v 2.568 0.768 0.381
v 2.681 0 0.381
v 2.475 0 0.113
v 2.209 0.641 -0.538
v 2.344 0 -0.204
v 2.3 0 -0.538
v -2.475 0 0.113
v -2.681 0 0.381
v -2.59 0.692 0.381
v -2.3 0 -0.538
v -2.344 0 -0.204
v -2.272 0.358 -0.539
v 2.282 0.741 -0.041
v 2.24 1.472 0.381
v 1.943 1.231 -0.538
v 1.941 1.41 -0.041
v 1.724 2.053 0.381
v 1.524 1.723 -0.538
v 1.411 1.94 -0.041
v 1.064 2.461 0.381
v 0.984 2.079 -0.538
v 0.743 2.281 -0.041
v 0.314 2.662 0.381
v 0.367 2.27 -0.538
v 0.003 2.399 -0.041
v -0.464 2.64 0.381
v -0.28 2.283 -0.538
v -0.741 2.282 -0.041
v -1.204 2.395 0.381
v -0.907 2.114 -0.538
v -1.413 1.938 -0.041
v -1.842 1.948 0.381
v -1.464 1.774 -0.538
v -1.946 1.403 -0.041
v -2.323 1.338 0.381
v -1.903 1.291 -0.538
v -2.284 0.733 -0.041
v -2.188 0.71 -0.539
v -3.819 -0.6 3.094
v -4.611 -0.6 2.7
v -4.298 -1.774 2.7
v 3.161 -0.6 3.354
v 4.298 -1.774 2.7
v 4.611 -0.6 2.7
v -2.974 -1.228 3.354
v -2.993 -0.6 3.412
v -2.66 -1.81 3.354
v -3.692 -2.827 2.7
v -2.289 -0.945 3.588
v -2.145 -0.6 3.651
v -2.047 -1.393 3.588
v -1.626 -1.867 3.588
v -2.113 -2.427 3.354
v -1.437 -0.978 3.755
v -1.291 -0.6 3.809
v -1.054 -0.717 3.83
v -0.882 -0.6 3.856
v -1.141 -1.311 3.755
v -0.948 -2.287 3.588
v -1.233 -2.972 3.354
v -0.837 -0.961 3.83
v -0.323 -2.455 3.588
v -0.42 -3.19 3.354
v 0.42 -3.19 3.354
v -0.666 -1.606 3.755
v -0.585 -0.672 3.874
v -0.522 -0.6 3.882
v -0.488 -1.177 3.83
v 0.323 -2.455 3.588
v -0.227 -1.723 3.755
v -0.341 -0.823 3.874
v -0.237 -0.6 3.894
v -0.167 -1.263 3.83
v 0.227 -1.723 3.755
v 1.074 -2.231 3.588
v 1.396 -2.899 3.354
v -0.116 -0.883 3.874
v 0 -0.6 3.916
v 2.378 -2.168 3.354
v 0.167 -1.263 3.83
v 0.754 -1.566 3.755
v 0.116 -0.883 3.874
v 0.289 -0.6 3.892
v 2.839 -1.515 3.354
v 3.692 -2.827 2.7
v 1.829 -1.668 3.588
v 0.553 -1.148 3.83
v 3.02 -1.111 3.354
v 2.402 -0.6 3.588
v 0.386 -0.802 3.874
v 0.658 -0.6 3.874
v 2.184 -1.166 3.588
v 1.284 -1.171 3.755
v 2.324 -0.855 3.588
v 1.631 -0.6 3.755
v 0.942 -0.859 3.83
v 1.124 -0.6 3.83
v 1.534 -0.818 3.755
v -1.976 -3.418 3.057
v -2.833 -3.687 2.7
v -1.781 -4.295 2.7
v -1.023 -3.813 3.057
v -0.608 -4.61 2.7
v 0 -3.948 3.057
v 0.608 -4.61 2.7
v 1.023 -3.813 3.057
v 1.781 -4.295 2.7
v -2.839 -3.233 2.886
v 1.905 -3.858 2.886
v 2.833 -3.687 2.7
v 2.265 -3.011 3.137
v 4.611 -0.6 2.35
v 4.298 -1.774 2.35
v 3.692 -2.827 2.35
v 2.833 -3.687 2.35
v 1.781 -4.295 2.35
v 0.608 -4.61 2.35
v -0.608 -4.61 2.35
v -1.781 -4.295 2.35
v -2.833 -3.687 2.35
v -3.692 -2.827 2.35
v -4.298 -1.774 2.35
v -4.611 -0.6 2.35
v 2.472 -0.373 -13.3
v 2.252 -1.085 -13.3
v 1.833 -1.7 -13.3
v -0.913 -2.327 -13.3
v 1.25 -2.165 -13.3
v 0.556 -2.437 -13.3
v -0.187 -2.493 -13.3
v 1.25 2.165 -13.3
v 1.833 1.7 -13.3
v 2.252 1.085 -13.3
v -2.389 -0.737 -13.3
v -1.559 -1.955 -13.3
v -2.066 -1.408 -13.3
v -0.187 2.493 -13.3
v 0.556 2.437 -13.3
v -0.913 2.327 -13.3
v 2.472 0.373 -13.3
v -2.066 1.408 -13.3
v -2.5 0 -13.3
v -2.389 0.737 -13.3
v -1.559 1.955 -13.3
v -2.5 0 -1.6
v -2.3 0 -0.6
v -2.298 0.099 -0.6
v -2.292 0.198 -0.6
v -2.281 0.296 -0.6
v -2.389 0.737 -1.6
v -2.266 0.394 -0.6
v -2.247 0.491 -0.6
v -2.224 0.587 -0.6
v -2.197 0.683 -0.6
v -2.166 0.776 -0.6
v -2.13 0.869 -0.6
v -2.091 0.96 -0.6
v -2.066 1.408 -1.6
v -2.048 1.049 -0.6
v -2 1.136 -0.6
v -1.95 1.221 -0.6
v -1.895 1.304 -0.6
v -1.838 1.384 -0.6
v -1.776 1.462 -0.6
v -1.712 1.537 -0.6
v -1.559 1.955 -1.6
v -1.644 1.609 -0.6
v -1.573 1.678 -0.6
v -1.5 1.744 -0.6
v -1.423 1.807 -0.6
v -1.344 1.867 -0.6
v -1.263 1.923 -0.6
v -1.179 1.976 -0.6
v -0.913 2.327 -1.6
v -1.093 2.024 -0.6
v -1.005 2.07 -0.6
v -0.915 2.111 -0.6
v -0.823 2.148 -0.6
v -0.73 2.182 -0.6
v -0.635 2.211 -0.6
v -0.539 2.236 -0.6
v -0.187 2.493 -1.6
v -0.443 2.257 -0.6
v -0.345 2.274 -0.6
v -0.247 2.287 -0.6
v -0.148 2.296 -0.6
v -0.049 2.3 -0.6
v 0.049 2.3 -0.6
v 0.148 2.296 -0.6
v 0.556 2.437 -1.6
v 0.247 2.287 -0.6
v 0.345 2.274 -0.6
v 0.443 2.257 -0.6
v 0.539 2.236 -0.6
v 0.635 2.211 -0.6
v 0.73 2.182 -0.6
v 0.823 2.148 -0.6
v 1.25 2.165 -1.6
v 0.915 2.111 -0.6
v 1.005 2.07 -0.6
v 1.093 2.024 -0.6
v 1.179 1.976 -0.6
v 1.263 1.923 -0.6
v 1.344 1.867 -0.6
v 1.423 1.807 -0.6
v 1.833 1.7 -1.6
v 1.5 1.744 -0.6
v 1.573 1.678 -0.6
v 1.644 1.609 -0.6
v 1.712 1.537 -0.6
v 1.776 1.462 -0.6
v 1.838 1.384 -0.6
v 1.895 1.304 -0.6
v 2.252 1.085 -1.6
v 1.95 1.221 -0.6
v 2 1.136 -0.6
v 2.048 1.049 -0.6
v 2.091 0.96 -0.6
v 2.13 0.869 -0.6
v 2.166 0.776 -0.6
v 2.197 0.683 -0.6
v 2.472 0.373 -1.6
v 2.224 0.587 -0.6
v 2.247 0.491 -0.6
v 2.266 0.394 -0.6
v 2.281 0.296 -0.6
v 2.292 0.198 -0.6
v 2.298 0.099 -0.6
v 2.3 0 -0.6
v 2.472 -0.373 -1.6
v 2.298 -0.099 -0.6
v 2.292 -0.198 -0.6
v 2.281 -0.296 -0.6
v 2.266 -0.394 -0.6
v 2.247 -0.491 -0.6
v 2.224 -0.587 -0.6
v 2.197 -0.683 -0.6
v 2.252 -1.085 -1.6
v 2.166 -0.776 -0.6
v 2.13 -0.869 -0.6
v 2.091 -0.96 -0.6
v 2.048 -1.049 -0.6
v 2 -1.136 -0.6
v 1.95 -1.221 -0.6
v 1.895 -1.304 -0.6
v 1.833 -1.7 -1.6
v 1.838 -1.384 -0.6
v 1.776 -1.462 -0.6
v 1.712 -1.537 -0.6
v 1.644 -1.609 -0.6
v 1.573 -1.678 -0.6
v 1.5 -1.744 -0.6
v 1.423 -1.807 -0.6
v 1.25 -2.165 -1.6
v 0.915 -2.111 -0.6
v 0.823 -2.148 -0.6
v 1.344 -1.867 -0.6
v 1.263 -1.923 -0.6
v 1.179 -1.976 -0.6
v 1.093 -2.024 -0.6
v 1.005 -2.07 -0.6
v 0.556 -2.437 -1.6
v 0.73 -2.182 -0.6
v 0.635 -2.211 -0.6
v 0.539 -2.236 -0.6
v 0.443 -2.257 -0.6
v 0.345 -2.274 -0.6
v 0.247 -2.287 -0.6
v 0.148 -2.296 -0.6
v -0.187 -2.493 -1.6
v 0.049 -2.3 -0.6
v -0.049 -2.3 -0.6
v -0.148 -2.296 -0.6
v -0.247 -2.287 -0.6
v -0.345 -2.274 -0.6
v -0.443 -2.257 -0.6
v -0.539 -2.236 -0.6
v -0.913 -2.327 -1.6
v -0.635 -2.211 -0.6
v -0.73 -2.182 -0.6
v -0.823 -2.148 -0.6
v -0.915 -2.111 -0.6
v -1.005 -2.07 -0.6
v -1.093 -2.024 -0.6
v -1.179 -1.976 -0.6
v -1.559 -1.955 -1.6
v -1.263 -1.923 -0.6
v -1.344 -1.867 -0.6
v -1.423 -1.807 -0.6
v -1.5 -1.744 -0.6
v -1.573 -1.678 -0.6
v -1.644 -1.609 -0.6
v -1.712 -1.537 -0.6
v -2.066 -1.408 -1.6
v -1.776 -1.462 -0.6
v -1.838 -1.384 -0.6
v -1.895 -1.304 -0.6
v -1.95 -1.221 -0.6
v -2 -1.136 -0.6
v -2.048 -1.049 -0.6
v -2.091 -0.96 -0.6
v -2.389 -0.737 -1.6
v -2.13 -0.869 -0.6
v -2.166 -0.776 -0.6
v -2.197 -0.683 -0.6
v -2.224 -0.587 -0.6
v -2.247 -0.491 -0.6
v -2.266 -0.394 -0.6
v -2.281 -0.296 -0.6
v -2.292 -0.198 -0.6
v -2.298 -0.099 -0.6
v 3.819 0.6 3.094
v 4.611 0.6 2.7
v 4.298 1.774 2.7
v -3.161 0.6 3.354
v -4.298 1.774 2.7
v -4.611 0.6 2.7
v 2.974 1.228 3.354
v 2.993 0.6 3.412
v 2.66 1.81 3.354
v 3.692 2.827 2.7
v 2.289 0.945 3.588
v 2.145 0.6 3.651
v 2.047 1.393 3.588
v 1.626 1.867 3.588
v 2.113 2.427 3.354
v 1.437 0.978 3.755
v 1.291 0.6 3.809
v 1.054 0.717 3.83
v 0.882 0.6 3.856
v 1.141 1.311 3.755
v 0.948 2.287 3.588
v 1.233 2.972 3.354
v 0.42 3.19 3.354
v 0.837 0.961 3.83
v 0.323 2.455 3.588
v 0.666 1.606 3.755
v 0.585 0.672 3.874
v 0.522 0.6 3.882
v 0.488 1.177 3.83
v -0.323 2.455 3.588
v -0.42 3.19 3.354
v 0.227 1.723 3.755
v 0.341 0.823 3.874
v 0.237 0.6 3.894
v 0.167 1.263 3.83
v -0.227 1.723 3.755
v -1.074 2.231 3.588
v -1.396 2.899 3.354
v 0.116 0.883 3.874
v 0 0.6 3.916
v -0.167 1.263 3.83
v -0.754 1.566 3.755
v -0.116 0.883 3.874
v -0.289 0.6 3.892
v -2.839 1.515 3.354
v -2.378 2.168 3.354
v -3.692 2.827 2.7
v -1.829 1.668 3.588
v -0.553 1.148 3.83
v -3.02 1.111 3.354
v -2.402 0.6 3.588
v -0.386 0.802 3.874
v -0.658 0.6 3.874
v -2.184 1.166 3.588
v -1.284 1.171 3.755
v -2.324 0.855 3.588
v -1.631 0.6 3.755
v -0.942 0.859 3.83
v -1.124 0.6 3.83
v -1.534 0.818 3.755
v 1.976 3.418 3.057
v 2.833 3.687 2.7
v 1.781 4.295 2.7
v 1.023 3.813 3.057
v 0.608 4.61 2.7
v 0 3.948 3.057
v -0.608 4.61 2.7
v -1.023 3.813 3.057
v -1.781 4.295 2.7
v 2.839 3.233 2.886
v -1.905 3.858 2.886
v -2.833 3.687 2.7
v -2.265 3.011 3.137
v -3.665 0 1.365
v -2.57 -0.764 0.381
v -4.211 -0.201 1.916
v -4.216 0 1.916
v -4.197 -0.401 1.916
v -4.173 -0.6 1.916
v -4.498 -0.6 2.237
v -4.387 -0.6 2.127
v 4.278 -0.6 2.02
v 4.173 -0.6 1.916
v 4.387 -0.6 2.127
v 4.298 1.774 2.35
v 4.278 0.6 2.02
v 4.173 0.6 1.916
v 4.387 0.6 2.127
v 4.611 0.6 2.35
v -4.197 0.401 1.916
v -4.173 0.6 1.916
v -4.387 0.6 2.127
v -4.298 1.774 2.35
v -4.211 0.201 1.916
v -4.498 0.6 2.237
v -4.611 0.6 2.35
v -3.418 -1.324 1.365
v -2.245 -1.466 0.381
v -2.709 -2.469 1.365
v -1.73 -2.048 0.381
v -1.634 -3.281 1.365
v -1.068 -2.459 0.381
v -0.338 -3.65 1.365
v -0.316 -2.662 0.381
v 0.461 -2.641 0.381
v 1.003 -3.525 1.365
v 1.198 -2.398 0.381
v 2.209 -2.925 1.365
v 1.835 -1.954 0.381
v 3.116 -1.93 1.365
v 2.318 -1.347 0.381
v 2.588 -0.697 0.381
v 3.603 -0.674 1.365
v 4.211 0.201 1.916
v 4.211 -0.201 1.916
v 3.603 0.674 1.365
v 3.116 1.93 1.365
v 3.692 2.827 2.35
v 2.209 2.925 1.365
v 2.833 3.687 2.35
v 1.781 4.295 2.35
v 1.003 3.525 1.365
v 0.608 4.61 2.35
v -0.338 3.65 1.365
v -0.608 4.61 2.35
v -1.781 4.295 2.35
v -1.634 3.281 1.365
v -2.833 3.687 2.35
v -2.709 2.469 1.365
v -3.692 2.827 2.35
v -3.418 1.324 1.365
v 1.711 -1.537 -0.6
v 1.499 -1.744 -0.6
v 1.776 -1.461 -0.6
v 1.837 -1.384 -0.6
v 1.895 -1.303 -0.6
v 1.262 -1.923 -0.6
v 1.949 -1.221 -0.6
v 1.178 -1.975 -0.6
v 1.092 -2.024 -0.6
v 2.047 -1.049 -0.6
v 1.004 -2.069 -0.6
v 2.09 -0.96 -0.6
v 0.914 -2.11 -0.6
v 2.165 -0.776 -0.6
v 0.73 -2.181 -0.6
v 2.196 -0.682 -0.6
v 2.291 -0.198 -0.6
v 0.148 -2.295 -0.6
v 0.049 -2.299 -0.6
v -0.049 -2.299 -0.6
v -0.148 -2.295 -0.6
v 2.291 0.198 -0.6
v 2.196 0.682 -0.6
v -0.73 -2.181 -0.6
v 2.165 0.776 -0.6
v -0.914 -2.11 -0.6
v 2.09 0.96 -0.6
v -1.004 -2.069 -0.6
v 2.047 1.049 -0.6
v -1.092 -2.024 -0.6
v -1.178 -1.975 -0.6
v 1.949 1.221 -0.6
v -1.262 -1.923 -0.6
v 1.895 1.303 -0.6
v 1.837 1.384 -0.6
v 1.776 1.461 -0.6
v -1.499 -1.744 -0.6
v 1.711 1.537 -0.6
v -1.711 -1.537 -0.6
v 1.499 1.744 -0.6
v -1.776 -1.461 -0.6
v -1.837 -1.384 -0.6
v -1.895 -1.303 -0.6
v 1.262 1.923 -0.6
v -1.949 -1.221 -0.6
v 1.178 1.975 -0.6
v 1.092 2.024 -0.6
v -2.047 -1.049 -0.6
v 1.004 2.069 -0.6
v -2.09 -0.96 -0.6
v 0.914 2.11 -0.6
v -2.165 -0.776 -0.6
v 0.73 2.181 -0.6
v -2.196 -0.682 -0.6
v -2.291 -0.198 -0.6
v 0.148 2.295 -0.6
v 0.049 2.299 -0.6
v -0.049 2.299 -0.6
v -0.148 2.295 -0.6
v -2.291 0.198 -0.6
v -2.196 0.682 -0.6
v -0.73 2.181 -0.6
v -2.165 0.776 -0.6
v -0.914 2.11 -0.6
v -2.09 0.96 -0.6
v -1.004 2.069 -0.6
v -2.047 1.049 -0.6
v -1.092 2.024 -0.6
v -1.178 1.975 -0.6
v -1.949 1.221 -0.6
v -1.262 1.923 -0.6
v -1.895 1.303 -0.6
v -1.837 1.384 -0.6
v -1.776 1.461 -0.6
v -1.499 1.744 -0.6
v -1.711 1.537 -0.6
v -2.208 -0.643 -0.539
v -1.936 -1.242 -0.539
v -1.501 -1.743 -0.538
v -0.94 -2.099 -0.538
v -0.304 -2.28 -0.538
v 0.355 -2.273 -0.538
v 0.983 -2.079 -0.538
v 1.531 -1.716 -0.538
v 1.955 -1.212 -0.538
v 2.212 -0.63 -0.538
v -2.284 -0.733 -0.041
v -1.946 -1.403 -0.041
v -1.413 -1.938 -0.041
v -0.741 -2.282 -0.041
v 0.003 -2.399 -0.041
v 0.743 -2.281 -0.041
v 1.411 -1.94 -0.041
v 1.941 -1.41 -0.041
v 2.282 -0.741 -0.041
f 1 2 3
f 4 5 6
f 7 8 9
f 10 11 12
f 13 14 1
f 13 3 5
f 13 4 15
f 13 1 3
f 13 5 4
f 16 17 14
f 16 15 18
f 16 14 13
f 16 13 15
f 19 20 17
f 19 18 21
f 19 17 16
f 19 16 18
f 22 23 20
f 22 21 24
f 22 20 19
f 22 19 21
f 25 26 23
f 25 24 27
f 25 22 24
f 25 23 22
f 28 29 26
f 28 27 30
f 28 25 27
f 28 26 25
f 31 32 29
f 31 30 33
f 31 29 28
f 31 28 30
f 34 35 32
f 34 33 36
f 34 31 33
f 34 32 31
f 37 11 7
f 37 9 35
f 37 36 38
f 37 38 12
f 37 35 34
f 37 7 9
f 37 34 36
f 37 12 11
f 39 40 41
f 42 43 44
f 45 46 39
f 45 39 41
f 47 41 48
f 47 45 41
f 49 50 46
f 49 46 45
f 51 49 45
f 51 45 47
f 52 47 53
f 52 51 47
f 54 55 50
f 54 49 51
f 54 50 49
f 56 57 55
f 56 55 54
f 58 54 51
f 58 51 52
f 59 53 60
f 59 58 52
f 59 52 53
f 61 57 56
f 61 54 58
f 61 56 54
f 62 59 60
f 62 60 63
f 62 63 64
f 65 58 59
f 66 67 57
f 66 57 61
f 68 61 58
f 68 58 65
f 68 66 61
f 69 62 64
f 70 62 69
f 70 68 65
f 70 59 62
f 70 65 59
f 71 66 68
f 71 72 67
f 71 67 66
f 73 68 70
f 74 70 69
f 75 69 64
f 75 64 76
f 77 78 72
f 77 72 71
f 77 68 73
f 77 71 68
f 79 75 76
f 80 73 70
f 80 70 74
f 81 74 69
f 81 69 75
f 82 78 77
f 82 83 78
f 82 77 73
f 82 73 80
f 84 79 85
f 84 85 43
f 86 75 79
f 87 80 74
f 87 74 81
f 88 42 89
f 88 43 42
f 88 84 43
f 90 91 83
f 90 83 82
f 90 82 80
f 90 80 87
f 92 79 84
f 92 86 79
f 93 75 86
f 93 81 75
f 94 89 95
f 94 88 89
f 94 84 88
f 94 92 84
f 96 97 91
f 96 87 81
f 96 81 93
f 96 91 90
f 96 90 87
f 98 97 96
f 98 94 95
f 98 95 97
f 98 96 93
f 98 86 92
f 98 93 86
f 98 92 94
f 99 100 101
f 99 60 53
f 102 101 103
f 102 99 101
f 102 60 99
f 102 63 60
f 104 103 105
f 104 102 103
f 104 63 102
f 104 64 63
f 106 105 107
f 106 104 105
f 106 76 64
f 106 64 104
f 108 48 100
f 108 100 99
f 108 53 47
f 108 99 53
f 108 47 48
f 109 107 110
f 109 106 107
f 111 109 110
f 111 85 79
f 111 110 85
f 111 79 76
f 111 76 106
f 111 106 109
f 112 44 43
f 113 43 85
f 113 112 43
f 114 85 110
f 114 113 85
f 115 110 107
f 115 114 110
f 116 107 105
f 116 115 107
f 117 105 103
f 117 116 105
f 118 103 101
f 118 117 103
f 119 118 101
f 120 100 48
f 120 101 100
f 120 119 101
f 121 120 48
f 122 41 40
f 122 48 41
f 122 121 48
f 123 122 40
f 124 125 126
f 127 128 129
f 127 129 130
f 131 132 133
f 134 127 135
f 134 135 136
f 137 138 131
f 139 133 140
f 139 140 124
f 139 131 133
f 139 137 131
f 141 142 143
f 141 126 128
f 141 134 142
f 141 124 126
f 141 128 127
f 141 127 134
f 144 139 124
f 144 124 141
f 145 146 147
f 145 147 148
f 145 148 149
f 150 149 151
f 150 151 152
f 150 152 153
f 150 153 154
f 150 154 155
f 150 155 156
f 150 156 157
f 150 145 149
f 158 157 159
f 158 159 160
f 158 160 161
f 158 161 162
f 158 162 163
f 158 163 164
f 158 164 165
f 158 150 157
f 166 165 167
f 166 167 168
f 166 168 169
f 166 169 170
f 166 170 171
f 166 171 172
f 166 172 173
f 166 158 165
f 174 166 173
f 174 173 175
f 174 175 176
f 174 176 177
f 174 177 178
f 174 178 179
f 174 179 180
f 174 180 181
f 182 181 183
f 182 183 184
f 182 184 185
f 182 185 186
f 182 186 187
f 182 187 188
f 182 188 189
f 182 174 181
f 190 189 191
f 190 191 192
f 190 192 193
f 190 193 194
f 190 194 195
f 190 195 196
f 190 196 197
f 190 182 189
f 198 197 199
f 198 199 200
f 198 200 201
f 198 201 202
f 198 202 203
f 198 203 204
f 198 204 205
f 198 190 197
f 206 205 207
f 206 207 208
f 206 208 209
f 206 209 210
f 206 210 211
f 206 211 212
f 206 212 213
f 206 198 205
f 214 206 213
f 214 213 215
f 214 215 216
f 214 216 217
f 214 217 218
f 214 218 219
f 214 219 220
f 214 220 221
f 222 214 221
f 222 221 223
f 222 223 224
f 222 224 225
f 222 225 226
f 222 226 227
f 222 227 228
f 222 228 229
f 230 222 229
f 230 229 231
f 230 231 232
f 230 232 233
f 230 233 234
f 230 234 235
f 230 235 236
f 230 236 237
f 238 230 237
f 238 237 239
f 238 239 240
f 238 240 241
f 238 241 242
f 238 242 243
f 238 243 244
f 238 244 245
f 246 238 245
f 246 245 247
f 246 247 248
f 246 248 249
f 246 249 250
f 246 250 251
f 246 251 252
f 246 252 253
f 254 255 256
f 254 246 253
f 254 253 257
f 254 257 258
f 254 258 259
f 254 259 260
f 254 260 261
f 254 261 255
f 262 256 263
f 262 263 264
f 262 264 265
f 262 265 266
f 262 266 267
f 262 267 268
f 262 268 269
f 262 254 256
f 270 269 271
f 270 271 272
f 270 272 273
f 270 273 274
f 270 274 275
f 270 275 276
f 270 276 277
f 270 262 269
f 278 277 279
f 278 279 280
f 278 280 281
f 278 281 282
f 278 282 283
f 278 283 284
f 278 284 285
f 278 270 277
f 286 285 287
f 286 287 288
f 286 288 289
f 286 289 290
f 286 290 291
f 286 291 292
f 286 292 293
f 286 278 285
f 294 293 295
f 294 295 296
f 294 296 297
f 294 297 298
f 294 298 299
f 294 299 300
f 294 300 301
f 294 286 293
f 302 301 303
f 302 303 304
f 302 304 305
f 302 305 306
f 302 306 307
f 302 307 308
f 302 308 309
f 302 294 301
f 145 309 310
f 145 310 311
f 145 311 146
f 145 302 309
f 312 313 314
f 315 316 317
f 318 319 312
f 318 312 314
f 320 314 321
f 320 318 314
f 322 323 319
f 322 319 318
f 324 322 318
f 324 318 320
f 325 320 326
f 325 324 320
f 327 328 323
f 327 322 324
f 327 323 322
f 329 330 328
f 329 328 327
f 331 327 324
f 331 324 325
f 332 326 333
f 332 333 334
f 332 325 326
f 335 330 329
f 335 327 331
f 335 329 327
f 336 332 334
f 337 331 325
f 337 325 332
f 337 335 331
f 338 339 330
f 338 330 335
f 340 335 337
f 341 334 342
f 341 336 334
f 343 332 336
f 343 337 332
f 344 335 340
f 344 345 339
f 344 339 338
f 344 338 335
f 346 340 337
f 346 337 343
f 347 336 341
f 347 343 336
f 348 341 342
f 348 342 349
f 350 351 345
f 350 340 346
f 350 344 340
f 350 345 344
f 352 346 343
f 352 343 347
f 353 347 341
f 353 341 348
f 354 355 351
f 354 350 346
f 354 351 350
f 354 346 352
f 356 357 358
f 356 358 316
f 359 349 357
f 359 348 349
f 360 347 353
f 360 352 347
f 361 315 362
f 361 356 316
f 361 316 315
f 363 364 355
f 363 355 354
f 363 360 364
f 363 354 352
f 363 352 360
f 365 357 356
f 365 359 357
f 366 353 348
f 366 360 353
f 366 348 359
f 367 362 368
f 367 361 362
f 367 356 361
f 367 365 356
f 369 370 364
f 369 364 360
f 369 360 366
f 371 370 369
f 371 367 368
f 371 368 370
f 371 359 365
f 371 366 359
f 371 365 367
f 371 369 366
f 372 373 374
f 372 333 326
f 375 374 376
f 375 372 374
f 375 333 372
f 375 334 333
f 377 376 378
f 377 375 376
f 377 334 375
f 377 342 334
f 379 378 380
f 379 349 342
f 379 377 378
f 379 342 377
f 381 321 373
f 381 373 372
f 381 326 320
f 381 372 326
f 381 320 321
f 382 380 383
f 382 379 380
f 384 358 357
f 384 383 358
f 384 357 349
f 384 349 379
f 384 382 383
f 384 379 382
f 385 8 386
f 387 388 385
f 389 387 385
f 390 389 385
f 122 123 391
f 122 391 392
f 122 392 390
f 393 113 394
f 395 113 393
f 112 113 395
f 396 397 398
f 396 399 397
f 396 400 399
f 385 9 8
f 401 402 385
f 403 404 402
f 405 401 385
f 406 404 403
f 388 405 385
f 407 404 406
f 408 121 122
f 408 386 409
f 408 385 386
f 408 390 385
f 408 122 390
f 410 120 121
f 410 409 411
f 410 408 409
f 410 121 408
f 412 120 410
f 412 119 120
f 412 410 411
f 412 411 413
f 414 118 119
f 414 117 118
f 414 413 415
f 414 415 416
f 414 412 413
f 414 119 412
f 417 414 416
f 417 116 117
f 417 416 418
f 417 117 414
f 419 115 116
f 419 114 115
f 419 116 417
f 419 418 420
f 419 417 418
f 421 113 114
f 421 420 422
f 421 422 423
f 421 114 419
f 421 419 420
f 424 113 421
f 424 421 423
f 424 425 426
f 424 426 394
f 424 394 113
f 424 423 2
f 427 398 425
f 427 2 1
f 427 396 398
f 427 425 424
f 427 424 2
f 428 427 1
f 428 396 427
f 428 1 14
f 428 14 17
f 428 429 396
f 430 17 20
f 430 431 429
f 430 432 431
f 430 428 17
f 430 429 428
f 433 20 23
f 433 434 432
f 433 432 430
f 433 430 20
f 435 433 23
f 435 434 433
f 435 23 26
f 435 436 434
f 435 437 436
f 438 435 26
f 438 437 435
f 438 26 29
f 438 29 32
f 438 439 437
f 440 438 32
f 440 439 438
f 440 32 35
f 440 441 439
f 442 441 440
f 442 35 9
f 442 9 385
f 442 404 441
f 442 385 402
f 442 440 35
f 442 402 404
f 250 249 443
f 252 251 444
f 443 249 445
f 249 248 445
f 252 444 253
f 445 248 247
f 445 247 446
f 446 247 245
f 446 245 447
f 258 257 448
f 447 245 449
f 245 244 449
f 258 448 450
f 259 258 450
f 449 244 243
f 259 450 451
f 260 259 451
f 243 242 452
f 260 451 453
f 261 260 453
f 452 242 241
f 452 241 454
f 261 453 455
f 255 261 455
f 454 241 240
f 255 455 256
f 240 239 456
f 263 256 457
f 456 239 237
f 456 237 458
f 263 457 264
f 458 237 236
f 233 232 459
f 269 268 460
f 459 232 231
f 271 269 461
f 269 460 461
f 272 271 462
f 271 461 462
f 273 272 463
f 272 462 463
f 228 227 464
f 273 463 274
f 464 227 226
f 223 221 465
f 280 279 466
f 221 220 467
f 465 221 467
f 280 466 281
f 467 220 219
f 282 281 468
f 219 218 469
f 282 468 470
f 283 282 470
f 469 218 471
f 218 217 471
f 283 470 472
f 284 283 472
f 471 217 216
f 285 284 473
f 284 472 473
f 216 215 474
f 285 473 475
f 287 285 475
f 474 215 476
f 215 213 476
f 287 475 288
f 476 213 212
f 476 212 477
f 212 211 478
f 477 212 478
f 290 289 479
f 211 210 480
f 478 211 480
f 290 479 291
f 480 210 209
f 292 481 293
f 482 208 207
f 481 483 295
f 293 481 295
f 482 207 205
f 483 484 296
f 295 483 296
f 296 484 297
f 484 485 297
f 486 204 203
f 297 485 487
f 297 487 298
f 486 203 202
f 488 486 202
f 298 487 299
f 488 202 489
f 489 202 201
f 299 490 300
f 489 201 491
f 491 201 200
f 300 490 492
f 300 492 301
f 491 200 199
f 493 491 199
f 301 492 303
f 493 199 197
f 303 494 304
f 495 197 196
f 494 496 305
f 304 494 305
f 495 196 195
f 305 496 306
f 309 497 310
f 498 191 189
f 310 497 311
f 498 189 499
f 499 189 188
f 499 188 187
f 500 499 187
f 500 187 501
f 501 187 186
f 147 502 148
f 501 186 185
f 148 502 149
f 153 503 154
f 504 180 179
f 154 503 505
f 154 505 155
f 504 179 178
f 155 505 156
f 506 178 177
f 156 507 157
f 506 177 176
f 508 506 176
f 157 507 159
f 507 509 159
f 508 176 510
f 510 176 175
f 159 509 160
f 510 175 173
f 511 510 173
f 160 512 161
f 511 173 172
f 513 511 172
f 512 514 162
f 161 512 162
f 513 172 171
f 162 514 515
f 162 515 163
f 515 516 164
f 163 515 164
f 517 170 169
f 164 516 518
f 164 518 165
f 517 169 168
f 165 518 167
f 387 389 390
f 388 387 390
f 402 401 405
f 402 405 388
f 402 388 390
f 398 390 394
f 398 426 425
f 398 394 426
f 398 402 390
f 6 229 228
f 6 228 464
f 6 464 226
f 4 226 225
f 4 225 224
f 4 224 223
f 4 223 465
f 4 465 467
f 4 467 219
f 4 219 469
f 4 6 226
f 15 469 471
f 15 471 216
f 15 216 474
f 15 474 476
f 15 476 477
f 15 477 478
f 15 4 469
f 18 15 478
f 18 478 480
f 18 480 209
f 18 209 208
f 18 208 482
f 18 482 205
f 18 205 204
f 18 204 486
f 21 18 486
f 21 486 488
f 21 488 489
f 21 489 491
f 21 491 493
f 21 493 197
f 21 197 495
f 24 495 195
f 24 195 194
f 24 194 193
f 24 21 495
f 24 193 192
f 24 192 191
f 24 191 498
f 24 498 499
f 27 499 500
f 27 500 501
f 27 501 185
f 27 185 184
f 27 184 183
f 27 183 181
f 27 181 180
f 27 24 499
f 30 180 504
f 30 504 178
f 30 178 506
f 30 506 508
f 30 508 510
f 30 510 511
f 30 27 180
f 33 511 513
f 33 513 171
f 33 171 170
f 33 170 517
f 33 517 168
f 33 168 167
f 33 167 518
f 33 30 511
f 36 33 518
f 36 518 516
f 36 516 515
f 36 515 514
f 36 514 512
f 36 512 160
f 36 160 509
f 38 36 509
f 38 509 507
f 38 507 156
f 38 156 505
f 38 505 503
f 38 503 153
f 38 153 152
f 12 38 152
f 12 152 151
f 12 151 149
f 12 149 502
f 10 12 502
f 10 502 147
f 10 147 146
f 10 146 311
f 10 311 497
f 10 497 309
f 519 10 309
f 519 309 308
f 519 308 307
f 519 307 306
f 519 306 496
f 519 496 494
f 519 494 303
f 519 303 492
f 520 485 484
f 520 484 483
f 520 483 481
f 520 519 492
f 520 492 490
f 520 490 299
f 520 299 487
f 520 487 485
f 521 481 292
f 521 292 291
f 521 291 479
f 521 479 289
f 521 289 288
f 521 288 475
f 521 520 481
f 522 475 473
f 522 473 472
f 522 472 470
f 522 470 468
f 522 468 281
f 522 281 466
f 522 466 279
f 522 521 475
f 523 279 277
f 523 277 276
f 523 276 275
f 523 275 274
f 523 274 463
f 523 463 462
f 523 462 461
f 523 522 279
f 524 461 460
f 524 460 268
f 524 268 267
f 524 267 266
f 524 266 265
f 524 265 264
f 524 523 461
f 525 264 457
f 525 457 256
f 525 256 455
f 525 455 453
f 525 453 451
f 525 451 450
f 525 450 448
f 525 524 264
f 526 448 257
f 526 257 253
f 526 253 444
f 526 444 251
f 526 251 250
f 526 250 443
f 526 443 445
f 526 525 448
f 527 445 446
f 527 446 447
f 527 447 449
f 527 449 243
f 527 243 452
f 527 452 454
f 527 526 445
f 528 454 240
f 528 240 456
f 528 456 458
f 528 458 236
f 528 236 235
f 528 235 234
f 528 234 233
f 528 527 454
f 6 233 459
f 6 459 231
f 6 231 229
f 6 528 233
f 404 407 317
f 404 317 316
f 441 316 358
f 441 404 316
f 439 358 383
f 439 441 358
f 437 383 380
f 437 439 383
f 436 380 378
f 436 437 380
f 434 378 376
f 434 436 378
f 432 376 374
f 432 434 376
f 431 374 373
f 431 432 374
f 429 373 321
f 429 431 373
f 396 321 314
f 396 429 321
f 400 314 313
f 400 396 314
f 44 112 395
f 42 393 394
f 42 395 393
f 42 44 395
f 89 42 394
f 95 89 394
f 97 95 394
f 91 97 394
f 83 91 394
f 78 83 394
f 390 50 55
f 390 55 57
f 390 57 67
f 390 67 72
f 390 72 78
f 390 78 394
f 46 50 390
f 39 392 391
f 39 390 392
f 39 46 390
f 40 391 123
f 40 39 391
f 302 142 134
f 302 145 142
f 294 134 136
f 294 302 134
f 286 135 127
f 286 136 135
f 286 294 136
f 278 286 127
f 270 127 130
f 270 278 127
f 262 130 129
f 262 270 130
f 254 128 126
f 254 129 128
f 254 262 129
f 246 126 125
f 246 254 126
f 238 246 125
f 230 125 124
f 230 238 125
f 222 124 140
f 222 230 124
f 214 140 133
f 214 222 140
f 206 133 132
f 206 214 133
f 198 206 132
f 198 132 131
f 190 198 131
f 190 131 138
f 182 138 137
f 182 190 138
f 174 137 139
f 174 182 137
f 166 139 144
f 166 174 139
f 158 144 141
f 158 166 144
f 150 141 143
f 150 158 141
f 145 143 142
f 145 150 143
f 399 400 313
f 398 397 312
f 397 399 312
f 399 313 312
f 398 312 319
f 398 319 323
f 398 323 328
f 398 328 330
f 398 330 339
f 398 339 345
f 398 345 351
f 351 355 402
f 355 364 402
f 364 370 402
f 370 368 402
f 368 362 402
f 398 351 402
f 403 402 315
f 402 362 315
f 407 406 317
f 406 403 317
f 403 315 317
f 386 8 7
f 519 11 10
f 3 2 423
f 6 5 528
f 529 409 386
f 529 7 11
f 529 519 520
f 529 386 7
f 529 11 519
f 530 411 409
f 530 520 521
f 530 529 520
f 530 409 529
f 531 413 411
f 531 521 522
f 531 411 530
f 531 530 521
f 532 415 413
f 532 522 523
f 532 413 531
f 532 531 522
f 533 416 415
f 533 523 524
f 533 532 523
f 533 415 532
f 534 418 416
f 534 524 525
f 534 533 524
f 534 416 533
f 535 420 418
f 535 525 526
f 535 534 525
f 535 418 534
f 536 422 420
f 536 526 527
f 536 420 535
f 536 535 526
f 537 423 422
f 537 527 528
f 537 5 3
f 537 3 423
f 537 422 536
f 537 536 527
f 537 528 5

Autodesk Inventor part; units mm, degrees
ref_plane "WorkPlane11" through (0, 0, 0) normal (0, 0, 1) x (1, 0, 0)
ref_plane "Work Plane2" through (0, 0, -4.9) normal (0, 0, 1) x (1, 0, 0)
ref_plane "WorkPlane9" through (0, 0, 8.3) normal (0, 0, 1) x (1, 0, 0)
sketch "Skizze1" plane through (0, 0, 0) normal (0, 0, 1) x (1, 0, 0)
  point P0 (0, 0)
sketch "Skizze2" plane through (0, 0, 0) normal (0, 0, 1) x (1, 0, 0)
  circle A0 centre (0, 0) radius 2.3
  dimension "d2" = 4.6
extrude "Extrusion1" add sketch "Skizze2" against normal blind 0.6
sketch "Skizze3" plane through (0, 0, -0.6) normal (0, 0, -1) x (-1, 0, 0)
  circle A0 centre (0, 0) radius 2.5
  circle A1 centre (0, 0) radius 2.3 construction
  dimension "d8" = 5
extrude "Extrusion2" add sketch "Skizze3" along normal blind 12.7
sketch "Skizze4" plane through (0, 0, 0) normal (0, 0, 1) x (1, 0, 0)
  circle A0 centre (0, 0) radius 4.65
  circle A1 centre (0, 0) radius 2.3 construction
  dimension "d12" = 9.3
extrude "Extrusion3" add sketch "Skizze4" along normal blind 2.7
sketch "Skizze5" plane through (0, 0, 0) normal (0, 1, 0) x (-1, 0, 0)
  line L0 (4.65, 0) -> (2.3, 0)
  line L1 (4.65, 2.35) -> (4.65, 0)
  line L2 (2.3, 0) -> (4.65, 2.35)
  line L3 (-4.65, 0) -> (4.65, 0) construction
  line L4 (0, -7.6493) -> (0, 5.8993)
  line L5 (0, -10.359) -> (0, 8.609) projected
  line L6 (4.65, 0) -> (4.65, 2.7) projected
  line L7 (-4.75, 0) -> (4.75, 0) projected
  line L8 (2.3, 0) -> (2.3, -0.6) projected
  dimension "d17" = 45
revolve "Drehung1" cut sketch "Skizze5" angle 360 about axis through (0, 0, -7.6493) along (0, 0, 1)
sketch "Skizze6" plane through (0, 0, 0) normal (0, 1, 0) x (-1, 0, 0)
  line L0 (0, 2.7) -> (0, 3.9158)
  line L1 (0, 2.7) -> (4.65, 2.7)
  arc A0 (4.65, 2.7) -> (0, 3.9158) centre (0, -5.5842) ccw
  line L2 (-4.65, 2.7) -> (4.65, 2.7) construction
  line L3 (0, -7.6493) -> (0, 5.8993)
  line L4 (0, -10.359) -> (0, 8.609) projected
  line L5 (4.65, 2.35) -> (4.65, 2.7) projected
  arc A1 (0, 3.9158) -> (-4.65, 2.7) centre (0, -5.5842) ccw
  dimension "d20" = 9.5
  dimension "d24" = 4.65
revolve "Drehung2" add sketch "Skizze6" angle 360 about axis through (0, 0, -7.6493) along (0, 0, 1)
fillet "Rundung1" radius 1.3 2 edges at (0, 2.3, 0) (0, -2.3, 0)
chamfer "Fase1" distance 1 distance2 0.2 1 edges at (2.5, 0, -0.6) measured on face at (-2.4919, -0.2012, -9.0667)
sketch "Skizze8" plane through (0, 0, 0) normal (0, 1, 0) x (-1, 0, 0)
  line L0 (-4.65, 3.9158) -> (4.65, 3.9158)
  line L1 (4.65, 3.9158) -> (4.65, 1.9158)
  line L2 (4.65, 1.9158) -> (-4.65, 1.9158)
  line L3 (-4.65, 1.9158) -> (-4.65, 3.9158)
  arc A0 (4.65, 2.7) -> (-4.65, 2.7) centre (0, -5.5842) ccw projected
  line L4 (-4.65, 2.35) -> (-4.65, 2.7) projected
  line L5 (4.65, 2.35) -> (4.65, 2.7) projected
  dimension "msp_d31" = 2
extrude "Extrusion4" cut sketch "Skizze8" against normal mid plane 1.2
thread "Gewinde1" size "M5x0.8" class "6g" standard "ISO Metric profile" full length
ref_plane "MSC_PF1" through (0, 0, 0) normal (1, 0, 0) x (0, 1, 0)
ref_plane "MSC_PT1" through (-4.65, 0, 2.35) normal (0, 0, -1) x (-1, 0, 0)
equation "\"d3\" = -msp_x + ParA"
equation "\"d8\" = NND"
equation "\"d9\" = msp_x - ParK + NLG - ParA"
equation "\"d12\" = Dk"
equation "\"d13\" = ParK"
equation "\"d28\" = r"
equation "\"d29\" = msp_x"
equation "\"d30\" = 0.25 * PTC"
equation "\"msp_d31\" = ParT"
equation "\"msp_d32\" = ParN"
equation "\"d2\" = 0.5 * PTC + msp_mdtds"
equation "\"d20\" = rf"
equation "\"d24\" = 0.5 * Dk"
equation "\"PTC\" = 0.8"
equation "\"NND\" = 5"
equation "\"msp_x\" = 1.25 * PTC"
equation "\"NLG\" = 16"
equation "\"msp_mdtds\" = NND - PTC"
equation "\"ParK\" = 2.7"
equation "\"ParN\" = 1.2"
equation "\"ParT\" = 2"
equation "\"r\" = 1.3"
equation "\"prf_c\" = 0"
equation "\"ParA\" = 1.6"
equation "\"Dk\" = 9.3"
equation "\"rf\" = 9.5"
equation "\"ParF\" = 1.2"
equation "\"THREADDIA\" = NND"
equation "\"TEMPLATE\" = 1.2345"
properties part number "DIN EN ISO 2010 - M5x16" material "Messing, weicher Gelbton"
